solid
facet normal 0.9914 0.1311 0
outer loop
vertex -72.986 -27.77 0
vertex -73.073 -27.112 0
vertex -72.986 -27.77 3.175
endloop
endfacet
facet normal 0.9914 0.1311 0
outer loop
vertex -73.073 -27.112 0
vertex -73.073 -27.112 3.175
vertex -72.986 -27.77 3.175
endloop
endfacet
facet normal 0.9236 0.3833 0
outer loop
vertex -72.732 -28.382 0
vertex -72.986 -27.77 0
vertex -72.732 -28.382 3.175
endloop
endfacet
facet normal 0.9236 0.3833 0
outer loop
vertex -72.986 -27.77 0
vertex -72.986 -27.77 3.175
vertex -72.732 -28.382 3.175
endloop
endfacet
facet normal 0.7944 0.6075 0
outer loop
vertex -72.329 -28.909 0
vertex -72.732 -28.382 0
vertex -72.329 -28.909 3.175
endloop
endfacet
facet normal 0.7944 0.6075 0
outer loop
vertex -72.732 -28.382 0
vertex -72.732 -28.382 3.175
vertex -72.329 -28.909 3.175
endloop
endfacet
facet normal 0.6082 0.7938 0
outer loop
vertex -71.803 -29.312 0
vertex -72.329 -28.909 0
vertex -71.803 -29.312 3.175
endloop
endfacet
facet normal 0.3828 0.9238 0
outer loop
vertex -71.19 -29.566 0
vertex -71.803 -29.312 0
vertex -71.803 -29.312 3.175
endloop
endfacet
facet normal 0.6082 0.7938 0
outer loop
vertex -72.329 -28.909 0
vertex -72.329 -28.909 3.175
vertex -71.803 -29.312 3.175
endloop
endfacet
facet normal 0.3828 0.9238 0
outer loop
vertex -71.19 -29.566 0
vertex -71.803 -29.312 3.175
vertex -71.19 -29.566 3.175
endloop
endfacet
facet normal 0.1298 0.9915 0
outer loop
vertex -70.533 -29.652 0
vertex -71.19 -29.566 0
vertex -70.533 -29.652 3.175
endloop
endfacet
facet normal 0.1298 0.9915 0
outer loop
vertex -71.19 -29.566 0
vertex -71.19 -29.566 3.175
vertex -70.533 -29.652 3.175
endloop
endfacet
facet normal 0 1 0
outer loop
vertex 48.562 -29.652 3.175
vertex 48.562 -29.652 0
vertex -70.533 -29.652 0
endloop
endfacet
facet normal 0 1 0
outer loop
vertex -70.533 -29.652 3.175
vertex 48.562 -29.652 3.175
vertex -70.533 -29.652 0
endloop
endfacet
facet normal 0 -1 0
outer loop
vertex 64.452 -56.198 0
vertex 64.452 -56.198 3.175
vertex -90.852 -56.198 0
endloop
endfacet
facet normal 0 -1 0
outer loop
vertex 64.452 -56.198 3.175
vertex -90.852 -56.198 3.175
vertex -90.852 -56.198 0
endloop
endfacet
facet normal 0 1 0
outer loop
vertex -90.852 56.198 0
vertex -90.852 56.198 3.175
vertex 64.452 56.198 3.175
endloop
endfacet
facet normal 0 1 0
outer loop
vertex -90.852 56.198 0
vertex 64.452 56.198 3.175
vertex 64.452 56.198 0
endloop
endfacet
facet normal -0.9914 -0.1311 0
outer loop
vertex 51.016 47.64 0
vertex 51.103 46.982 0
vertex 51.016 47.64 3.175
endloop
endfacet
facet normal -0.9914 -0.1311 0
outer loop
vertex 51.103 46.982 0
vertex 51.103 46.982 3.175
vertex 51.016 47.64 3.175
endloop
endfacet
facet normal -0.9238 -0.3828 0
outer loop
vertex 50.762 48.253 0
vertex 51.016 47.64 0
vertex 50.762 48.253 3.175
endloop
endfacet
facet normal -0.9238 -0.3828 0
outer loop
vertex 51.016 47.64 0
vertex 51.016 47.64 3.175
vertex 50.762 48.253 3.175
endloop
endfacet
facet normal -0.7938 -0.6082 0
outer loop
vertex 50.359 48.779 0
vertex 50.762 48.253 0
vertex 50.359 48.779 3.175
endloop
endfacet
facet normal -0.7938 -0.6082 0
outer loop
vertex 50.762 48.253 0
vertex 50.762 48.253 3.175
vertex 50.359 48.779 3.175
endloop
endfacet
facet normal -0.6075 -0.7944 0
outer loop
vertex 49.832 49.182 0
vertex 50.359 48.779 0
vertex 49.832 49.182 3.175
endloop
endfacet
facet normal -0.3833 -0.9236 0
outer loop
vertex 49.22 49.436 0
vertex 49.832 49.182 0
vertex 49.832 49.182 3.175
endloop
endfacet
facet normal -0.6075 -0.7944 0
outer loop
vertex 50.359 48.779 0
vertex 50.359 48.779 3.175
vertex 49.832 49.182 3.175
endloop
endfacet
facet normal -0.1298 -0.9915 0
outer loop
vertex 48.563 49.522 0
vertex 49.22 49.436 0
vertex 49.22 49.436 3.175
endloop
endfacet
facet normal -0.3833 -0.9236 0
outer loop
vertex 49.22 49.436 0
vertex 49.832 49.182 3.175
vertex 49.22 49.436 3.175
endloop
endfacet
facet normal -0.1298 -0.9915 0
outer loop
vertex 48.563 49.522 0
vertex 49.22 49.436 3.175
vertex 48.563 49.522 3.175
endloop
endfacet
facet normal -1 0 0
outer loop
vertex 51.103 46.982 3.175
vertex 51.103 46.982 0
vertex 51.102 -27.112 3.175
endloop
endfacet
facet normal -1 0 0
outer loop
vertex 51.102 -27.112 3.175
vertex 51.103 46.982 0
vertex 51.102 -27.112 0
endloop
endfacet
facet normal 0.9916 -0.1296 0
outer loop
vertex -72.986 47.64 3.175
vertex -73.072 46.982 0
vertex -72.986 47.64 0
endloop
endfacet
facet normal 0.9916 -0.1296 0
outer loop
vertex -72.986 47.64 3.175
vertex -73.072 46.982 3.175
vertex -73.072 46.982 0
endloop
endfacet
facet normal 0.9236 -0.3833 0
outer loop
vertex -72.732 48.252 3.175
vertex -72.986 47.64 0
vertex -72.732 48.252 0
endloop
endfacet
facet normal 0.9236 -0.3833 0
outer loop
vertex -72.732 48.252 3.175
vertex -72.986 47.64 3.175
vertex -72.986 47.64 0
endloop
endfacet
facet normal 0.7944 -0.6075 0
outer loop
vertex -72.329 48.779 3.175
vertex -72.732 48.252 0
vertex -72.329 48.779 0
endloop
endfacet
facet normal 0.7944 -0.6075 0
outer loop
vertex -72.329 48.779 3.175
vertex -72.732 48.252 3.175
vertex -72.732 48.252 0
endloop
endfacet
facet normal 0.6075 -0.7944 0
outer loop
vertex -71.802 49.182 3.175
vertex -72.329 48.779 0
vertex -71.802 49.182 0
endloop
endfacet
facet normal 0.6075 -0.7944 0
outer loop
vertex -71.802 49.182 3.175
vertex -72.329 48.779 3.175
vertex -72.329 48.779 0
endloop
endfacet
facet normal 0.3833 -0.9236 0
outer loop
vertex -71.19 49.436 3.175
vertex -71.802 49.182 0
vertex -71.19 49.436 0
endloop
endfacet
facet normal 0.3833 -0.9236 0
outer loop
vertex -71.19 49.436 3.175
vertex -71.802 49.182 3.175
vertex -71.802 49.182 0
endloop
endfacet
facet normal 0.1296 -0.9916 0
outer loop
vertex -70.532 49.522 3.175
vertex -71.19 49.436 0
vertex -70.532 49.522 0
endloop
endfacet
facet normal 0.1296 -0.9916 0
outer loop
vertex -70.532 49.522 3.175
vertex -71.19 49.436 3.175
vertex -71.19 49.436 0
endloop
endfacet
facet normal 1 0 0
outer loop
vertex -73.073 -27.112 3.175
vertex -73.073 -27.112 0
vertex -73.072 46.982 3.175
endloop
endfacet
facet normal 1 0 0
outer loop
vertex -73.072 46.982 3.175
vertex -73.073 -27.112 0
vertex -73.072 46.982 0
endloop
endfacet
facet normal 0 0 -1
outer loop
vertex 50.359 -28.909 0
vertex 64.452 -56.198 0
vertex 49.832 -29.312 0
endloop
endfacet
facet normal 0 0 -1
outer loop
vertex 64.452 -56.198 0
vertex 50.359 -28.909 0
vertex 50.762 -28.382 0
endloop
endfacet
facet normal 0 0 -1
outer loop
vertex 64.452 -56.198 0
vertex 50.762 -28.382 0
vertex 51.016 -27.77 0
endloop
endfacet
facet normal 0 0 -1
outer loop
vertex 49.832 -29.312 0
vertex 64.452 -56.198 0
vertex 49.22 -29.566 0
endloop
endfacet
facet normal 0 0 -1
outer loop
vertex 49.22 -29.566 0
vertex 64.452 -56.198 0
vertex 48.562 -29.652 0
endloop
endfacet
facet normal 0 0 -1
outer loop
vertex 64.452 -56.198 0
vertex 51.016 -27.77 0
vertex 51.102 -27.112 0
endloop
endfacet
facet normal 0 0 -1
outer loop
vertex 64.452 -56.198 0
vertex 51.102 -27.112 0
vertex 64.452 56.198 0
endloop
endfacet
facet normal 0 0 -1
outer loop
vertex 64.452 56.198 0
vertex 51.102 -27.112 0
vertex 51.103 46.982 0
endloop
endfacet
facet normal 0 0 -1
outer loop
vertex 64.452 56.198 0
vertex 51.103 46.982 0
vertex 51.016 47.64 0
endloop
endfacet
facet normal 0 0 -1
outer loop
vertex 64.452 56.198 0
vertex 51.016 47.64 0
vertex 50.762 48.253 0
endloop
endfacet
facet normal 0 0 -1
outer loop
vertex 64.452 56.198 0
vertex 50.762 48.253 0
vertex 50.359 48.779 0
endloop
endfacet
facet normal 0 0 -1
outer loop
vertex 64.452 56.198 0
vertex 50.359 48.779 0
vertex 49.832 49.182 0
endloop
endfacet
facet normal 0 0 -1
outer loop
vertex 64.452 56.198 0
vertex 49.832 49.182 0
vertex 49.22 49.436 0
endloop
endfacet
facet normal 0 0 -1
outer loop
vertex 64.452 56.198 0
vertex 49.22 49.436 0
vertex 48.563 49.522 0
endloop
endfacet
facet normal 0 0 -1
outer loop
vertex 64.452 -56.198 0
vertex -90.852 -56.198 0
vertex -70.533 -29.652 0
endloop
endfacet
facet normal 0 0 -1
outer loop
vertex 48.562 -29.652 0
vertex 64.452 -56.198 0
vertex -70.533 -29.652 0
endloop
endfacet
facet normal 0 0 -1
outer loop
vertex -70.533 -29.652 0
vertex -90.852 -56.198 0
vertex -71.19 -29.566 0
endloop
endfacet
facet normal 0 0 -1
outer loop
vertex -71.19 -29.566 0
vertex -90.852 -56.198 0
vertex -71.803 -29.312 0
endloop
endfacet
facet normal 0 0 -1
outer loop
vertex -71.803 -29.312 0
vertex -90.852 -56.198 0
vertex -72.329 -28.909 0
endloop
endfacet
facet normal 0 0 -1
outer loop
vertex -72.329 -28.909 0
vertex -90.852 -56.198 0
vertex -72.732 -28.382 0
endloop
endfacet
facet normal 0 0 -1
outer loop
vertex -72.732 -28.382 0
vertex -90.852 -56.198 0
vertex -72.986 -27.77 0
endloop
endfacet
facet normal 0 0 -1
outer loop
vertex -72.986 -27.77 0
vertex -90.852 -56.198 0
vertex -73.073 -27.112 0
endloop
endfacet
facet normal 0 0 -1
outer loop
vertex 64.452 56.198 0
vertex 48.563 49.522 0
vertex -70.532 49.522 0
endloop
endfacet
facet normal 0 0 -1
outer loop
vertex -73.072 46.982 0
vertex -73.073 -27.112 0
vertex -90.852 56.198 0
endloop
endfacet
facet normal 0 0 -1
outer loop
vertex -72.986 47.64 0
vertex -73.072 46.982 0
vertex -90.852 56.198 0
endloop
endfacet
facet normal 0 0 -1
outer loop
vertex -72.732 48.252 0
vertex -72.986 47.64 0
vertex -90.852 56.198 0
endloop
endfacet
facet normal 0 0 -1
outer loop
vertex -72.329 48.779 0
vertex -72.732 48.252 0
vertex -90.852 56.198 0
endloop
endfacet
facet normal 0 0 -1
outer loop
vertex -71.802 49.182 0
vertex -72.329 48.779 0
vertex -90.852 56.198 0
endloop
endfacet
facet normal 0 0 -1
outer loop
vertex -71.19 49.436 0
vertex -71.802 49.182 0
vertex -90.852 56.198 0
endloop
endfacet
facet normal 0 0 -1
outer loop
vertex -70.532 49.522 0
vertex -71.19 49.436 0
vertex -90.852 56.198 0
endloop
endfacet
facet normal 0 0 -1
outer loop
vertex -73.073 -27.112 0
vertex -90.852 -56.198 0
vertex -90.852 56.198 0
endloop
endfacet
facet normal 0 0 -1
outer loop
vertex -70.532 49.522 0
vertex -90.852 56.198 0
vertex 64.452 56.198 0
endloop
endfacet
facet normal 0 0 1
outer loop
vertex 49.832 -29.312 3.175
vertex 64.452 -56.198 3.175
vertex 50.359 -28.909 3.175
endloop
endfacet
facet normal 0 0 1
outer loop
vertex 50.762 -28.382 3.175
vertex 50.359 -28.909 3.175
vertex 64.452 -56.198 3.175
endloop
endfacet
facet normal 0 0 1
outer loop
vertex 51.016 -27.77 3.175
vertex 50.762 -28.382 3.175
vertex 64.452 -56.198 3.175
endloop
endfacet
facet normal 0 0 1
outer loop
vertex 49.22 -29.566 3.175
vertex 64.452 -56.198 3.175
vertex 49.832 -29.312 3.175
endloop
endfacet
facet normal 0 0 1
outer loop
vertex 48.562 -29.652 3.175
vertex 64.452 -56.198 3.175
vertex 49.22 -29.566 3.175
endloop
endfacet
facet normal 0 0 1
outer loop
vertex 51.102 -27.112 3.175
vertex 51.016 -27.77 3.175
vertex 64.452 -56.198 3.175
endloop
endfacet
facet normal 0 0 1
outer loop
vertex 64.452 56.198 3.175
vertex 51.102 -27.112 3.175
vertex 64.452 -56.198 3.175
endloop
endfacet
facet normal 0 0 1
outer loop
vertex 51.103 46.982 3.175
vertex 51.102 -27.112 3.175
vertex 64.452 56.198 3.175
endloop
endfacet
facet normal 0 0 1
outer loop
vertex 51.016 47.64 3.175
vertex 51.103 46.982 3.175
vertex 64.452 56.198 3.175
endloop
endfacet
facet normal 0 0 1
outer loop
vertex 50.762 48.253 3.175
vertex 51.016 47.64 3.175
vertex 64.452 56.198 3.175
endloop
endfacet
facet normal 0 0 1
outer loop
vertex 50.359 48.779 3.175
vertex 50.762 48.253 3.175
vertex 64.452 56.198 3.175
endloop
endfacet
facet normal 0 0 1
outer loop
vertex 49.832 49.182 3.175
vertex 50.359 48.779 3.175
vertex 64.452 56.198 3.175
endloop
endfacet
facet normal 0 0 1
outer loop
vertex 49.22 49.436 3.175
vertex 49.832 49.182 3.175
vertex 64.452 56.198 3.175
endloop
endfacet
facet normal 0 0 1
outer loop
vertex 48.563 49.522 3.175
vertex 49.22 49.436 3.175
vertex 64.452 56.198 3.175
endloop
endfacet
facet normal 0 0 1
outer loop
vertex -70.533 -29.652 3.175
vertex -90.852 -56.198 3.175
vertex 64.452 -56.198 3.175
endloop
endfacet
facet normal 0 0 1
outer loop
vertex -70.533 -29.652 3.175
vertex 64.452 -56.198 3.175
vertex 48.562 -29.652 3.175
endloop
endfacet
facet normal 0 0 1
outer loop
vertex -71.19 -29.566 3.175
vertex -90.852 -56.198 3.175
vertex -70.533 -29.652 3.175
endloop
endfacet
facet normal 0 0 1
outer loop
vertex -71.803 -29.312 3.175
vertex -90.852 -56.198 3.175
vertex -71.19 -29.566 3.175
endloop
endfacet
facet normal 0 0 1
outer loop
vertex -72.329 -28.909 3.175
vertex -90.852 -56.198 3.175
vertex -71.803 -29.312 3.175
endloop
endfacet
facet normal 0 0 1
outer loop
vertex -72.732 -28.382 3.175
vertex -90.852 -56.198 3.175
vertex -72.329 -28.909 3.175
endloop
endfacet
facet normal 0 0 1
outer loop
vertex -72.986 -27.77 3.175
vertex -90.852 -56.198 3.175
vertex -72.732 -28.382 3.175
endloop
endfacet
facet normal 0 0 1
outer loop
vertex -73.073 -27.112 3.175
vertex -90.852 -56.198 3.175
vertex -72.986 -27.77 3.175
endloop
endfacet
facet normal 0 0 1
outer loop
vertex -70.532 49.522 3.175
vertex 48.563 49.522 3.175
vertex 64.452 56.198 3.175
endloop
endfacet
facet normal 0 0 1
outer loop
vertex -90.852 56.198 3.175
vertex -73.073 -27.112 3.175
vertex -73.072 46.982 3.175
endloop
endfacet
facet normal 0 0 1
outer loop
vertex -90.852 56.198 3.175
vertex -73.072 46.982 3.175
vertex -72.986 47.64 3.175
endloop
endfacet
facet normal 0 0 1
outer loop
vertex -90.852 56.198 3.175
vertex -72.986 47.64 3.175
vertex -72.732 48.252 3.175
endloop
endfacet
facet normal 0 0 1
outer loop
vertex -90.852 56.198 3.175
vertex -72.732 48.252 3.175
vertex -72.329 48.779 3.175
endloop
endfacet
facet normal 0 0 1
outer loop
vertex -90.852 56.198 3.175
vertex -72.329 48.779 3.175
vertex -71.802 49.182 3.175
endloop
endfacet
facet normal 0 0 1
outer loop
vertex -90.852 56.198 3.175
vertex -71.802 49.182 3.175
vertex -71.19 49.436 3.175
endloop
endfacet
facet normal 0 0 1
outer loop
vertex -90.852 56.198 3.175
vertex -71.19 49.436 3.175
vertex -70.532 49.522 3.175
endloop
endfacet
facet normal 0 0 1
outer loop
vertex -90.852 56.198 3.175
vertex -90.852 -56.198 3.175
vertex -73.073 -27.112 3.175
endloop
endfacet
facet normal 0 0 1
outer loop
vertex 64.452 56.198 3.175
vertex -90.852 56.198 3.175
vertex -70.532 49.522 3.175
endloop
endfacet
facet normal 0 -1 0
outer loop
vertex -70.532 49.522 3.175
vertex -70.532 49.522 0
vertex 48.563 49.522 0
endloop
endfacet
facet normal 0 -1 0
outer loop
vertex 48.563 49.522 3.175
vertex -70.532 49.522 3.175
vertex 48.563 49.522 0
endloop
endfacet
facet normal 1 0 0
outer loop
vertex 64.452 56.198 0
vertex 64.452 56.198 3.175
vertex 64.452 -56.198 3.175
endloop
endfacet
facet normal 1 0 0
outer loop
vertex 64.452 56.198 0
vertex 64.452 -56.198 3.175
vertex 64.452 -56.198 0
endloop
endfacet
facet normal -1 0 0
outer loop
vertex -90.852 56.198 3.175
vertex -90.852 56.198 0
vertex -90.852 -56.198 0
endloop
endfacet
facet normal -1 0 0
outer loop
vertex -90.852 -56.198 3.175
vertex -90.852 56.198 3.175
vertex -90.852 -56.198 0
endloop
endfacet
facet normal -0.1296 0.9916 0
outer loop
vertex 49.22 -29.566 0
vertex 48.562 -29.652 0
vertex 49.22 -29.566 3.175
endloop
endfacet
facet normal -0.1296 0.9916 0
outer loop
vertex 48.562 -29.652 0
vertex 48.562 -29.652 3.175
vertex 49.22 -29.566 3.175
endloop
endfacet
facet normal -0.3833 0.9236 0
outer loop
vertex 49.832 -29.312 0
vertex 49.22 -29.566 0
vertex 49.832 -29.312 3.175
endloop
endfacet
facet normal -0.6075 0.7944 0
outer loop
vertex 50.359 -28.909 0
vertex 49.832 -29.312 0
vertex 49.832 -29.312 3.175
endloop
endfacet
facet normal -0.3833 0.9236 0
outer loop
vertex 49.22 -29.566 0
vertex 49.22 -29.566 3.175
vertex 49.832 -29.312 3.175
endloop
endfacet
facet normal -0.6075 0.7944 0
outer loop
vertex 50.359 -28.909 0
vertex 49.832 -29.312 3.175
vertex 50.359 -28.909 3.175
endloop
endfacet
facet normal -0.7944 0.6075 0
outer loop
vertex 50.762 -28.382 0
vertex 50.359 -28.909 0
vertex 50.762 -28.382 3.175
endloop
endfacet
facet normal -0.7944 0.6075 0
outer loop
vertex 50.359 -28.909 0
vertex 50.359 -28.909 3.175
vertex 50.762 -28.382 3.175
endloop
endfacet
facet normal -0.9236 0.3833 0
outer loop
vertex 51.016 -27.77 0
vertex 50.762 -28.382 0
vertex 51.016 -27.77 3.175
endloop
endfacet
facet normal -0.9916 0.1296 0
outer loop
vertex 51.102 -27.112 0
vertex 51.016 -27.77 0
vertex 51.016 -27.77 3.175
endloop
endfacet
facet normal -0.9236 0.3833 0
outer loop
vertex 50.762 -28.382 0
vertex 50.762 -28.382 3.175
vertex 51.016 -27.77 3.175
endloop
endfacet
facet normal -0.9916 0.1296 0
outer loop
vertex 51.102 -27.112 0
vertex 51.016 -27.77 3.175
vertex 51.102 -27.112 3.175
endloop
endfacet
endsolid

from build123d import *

# Parameters (mm, degrees)
BOSS_EXTRUDE1_DEPTH = 3.175
SKETCH2_W           = 3.175
SKETCH2_H           = 112.395
BOSS_EXTRUDE2_DEPTH = 3.175
FILLET1_R           = 2.54


with BuildPart() as part:
    # Sketch1 → Boss-Extrude1 (new body)
    with BuildSketch(Plane.XY):
        Polygon((61.2775, 1.5875), (61.2775, -56.1975), (0, -56.1975), (-90.8525, -56.1975), (-90.8525, 5.302053944), (-90.8525, 56.1975), (-7.104289944, 56.1975), (61.2775, 56.1975), align=None)
        Polygon((-73.0725, -29.6525), (-10.985, -29.6525), (51.1025, -29.6525), (51.1025, 9.935), (51.1025, 49.5225), (-10.985, 49.5225), (-73.0725, 49.5225), (-73.0725, 47.935), (-73.0725, 9.935), align=None, mode=Mode.SUBTRACT)
    extrude(amount=BOSS_EXTRUDE1_DEPTH)

    # Sketch2 → Boss-Extrude2 (add)
    with BuildSketch(Plane(origin=(61.2775, 0, 0), x_dir=(0, 0, -1), z_dir=(1, 0, 0))):
        with Locations((-1.5875, 0)):
            Rectangle(SKETCH2_W, SKETCH2_H)
    extrude(amount=BOSS_EXTRUDE2_DEPTH)

    # Fillet1
    fillet1_edges = [part.edges().sort_by_distance(p)[0] for p in [
        (51.1025, -29.6525, 1.5875),
        (51.1025, 49.5225, 1.5875),
        (-73.0725, 49.5225, 1.5875),
        (-73.0725, -29.6525, 1.5875),
    ]]
    fillet(fillet1_edges, radius=FILLET1_R)


solid = part.part
